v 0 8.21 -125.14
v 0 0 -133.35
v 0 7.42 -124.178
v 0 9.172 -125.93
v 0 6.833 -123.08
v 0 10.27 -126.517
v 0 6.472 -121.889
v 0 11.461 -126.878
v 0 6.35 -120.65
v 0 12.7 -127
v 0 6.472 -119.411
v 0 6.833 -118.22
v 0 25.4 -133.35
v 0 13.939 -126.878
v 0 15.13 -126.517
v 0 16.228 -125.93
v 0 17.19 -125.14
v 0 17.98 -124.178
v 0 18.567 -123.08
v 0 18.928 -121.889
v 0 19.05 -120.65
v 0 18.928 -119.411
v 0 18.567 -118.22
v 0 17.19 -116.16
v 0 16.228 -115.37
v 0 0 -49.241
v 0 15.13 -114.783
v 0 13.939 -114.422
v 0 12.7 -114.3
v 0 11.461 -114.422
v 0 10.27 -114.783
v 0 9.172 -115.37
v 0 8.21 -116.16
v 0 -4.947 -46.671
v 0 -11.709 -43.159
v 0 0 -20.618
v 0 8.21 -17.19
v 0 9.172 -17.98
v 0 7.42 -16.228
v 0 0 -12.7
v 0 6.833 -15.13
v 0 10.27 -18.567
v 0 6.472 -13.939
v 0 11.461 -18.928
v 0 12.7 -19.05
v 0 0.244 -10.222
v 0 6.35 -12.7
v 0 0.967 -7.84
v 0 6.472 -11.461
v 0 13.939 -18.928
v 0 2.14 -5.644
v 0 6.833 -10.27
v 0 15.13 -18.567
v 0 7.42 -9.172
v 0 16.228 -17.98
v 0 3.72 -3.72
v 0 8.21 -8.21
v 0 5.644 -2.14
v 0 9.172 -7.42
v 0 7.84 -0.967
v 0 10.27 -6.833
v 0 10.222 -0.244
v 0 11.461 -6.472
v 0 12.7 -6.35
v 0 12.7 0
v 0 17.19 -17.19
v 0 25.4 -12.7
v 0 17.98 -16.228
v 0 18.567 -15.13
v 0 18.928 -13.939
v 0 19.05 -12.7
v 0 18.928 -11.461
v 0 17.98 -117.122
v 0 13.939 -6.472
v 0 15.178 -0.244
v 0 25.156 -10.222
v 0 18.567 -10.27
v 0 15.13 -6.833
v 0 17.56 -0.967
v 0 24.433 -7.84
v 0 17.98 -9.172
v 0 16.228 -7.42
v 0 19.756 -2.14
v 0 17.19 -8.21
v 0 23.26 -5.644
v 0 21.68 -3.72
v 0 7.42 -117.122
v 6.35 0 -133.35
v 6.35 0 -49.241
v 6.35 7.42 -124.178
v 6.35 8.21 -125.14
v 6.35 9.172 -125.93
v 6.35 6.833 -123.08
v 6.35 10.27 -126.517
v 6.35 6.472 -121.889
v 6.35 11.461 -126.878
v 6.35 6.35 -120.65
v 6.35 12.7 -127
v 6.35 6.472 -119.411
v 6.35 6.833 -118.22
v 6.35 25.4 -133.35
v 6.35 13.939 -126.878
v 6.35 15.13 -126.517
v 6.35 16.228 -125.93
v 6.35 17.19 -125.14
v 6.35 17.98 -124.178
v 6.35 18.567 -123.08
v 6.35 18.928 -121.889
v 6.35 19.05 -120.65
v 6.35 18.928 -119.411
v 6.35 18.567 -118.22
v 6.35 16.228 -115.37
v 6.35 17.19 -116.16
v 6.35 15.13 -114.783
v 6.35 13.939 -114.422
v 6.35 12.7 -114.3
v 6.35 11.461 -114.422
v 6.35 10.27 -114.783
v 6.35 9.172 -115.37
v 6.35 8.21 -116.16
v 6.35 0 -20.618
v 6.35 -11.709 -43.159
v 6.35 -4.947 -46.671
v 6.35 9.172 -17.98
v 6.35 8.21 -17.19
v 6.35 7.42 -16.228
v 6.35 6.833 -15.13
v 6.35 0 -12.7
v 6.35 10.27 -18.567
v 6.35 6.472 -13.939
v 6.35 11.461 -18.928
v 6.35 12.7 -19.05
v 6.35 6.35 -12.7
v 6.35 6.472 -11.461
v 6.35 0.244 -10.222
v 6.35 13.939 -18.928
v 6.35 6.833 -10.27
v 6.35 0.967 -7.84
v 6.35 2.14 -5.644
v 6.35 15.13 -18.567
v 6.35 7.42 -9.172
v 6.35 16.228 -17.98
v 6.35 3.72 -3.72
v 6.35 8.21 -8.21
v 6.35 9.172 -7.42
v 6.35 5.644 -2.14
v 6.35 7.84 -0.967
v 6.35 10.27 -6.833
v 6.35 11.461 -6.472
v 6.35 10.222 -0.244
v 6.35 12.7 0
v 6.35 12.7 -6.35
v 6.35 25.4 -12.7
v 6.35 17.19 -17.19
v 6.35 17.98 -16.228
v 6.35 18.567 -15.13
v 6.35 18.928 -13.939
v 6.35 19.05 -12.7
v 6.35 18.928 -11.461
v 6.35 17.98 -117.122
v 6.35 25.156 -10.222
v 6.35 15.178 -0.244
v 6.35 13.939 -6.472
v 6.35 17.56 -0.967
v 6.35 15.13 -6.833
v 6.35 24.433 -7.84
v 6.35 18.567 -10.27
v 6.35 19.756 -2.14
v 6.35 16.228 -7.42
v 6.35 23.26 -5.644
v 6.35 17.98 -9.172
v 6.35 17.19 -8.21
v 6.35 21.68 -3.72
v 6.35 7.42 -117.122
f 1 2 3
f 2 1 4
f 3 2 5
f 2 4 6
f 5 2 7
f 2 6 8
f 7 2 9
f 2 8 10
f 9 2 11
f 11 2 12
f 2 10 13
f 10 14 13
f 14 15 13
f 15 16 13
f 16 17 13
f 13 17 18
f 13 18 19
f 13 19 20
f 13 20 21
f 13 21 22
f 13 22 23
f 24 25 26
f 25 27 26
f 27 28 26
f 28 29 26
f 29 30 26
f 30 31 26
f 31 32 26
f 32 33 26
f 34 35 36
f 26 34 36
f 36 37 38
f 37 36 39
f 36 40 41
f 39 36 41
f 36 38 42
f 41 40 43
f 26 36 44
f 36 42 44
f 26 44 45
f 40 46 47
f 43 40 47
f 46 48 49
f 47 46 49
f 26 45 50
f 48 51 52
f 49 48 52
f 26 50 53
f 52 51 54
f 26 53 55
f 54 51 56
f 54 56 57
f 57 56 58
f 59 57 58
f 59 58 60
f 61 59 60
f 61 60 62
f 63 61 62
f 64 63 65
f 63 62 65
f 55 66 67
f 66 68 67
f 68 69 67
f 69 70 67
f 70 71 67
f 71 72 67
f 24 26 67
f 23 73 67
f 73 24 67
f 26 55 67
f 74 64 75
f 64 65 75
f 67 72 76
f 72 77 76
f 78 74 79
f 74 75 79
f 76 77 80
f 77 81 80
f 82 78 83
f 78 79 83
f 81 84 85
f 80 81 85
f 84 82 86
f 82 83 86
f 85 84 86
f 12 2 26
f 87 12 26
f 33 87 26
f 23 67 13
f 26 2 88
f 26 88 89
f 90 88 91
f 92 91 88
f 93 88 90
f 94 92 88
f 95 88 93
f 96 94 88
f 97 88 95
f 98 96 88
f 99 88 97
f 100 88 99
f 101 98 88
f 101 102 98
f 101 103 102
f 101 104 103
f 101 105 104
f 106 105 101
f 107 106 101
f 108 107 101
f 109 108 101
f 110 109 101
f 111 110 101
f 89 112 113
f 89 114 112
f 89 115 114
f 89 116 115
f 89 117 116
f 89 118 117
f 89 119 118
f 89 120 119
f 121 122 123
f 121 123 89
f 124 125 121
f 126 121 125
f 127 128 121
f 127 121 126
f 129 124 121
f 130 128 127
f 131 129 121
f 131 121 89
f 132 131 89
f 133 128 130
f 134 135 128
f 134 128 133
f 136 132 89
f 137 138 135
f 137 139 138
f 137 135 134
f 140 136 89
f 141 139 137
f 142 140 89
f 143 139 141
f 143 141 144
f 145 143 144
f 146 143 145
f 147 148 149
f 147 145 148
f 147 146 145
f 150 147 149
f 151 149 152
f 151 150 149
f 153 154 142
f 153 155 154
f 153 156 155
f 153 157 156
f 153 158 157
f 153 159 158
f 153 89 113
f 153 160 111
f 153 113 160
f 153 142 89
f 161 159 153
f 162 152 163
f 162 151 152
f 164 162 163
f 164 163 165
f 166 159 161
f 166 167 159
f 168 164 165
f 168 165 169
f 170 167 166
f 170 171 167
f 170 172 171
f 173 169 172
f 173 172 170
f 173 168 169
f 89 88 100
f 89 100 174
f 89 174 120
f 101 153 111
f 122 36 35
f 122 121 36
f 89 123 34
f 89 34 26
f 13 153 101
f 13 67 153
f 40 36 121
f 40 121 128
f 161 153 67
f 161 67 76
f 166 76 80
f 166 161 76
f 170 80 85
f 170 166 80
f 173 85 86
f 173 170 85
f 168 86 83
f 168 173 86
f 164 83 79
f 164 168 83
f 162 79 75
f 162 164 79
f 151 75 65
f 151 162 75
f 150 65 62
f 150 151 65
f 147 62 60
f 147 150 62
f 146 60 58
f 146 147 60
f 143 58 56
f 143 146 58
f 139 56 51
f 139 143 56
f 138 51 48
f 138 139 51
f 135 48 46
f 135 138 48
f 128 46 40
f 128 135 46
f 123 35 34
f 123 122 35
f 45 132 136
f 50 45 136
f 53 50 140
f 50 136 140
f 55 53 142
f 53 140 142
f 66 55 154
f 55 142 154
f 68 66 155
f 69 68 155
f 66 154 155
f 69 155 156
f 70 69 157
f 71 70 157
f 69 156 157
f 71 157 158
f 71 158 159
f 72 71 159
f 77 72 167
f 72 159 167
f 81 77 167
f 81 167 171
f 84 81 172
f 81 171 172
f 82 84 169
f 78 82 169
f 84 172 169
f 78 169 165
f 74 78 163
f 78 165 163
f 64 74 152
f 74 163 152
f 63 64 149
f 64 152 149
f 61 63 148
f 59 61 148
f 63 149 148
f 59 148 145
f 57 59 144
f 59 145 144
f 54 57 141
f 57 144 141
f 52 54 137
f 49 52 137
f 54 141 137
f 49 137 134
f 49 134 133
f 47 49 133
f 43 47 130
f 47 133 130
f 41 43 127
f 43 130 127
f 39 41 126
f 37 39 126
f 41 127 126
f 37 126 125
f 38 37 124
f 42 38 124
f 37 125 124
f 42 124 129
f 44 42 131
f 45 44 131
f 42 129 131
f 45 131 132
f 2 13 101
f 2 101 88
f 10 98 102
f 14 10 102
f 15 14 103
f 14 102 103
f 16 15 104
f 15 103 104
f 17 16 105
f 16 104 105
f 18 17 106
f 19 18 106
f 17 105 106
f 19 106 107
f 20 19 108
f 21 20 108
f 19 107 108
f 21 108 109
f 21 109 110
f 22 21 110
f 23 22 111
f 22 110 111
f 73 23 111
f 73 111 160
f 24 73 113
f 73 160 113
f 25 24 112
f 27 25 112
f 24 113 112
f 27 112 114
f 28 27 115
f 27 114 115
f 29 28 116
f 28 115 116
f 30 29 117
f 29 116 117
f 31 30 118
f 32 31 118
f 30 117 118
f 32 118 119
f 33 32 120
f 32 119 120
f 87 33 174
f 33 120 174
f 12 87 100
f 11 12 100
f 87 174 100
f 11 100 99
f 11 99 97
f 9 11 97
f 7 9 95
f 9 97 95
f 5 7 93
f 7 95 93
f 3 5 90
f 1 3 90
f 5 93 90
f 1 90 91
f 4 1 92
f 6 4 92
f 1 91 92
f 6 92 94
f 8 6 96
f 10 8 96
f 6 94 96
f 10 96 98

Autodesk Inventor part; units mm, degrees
ref_plane "YZ Plane" through (0, 0, 0) normal (1, 0, 0) x (0, 1, 0)
ref_plane "XZ Plane" through (0, 0, 0) normal (0, 1, 0) x (-1, 0, 0)
ref_plane "XY Plane" through (0, 0, 0) normal (0, 0, 1) x (1, 0, 0)
sketch "Sketch1" plane through (0, 0, 0) normal (1, 0, 0) x (0, 1, 0)
  line L0 (0, 0) -> (25.4, 0)
  line L1 (25.4, 0) -> (25.4, -133.35)
  line L2 (25.4, -133.35) -> (0, -133.35)
  line L3 (0, -133.35) -> (0, 0)
  dimension "d0" = 25.4
  dimension "d1" = 133.35
extrude "Extrusion1" add sketch "Sketch1" along normal blind 6.35
sketch "Sketch2" plane through (6.35, 0, 0) normal (1, 0, 0) x (0, 0, -1)
  line L0 (133.35, 0) -> (133.35, 25.4) projected
  line L1 (133.35, 25.4) -> (0, 25.4) projected
  line L2 (0, 25.4) -> (0, 0) projected
  line L3 (0, 0) -> (133.35, 0) projected
  circle A0 centre (12.7, 12.7) radius 6.35
  circle A1 centre (120.65, 12.7) radius 6.35
  dimension "d4" = 25.4
  dimension "d5" = 12.7
  dimension "d6" = 12.7
  dimension "d7" = 107.95
  dimension "d8" = 133.35
  dimension "d9" = 12.7
  dimension "d10" = 12.7
  dimension "d11" = 12.7
extrude "Extrusion2" cut sketch "Sketch2" against normal blind 6.35 contours A0 | A1
sketch "Sketch3" plane through (6.35, 0, 0) normal (1, 0, 0) x (0, 0, -1)
  circle A0 centre (12.7, 12.7) radius 6.35 projected
  circle A1 centre (12.7, 12.7) radius 12.7
  line L0 (133.35, 25.4) -> (0, 25.4) projected
  line L1 (0, 25.4) -> (0, 0) projected
  line L2 (0, 0) -> (133.35, 0) projected
  point P0 (12.7, 0)
  point P1 (0, 12.7)
  point P2 (12.7, 25.4)
extrude "Extrusion3" cut sketch "Sketch3" against normal blind 6.35 contours A1 L1 L0 | L2 L1 A1
sketch "Sketch4" plane through (6.35, 0, 0) normal (1, 0, 0) x (0, 0, -1)
  circle A0 centre (12.7, 12.7) radius 6.35 projected
  line L0 (120.65, 12.7) -> (12.7, 12.7)
  circle A1 centre (120.65, 12.7) radius 6.35 projected
  line L1 (12.7, 12.7) -> (120.65, -43.3755)
  line L2 (120.65, -43.3755) -> (120.65, 12.7)
  line L3 (12.7, 12.7) -> (9.1874, 5.9379)
  line L4 (9.1874, 5.9379) -> (43.1586, -11.7087)
  line L5 (43.1586, -11.7087) -> (46.6713, -4.9467)
  line L6 (12.7, 0) -> (133.35, 0) projected
  line L7 (46.6713, -4.9467) -> (49.2408, 0)
  point P0 (0, 0)
  point P1 (20.6183, 0)
  dimension "d16" = 27.45
  dimension "d19" = 25.4
  dimension "d22" = 7.62
extrude "Extrusion4" add sketch "Sketch4" against normal blind 6.35 contours L6 L7 L1 | L1 L5 L4 L6
equation "\"d5\" = 0.5 * d4"
equation "\"d6\" = d5"
equation "\"d9\" = -0.5 * d7 + 0.5 * d8"
properties part number "IntakeBraket"
